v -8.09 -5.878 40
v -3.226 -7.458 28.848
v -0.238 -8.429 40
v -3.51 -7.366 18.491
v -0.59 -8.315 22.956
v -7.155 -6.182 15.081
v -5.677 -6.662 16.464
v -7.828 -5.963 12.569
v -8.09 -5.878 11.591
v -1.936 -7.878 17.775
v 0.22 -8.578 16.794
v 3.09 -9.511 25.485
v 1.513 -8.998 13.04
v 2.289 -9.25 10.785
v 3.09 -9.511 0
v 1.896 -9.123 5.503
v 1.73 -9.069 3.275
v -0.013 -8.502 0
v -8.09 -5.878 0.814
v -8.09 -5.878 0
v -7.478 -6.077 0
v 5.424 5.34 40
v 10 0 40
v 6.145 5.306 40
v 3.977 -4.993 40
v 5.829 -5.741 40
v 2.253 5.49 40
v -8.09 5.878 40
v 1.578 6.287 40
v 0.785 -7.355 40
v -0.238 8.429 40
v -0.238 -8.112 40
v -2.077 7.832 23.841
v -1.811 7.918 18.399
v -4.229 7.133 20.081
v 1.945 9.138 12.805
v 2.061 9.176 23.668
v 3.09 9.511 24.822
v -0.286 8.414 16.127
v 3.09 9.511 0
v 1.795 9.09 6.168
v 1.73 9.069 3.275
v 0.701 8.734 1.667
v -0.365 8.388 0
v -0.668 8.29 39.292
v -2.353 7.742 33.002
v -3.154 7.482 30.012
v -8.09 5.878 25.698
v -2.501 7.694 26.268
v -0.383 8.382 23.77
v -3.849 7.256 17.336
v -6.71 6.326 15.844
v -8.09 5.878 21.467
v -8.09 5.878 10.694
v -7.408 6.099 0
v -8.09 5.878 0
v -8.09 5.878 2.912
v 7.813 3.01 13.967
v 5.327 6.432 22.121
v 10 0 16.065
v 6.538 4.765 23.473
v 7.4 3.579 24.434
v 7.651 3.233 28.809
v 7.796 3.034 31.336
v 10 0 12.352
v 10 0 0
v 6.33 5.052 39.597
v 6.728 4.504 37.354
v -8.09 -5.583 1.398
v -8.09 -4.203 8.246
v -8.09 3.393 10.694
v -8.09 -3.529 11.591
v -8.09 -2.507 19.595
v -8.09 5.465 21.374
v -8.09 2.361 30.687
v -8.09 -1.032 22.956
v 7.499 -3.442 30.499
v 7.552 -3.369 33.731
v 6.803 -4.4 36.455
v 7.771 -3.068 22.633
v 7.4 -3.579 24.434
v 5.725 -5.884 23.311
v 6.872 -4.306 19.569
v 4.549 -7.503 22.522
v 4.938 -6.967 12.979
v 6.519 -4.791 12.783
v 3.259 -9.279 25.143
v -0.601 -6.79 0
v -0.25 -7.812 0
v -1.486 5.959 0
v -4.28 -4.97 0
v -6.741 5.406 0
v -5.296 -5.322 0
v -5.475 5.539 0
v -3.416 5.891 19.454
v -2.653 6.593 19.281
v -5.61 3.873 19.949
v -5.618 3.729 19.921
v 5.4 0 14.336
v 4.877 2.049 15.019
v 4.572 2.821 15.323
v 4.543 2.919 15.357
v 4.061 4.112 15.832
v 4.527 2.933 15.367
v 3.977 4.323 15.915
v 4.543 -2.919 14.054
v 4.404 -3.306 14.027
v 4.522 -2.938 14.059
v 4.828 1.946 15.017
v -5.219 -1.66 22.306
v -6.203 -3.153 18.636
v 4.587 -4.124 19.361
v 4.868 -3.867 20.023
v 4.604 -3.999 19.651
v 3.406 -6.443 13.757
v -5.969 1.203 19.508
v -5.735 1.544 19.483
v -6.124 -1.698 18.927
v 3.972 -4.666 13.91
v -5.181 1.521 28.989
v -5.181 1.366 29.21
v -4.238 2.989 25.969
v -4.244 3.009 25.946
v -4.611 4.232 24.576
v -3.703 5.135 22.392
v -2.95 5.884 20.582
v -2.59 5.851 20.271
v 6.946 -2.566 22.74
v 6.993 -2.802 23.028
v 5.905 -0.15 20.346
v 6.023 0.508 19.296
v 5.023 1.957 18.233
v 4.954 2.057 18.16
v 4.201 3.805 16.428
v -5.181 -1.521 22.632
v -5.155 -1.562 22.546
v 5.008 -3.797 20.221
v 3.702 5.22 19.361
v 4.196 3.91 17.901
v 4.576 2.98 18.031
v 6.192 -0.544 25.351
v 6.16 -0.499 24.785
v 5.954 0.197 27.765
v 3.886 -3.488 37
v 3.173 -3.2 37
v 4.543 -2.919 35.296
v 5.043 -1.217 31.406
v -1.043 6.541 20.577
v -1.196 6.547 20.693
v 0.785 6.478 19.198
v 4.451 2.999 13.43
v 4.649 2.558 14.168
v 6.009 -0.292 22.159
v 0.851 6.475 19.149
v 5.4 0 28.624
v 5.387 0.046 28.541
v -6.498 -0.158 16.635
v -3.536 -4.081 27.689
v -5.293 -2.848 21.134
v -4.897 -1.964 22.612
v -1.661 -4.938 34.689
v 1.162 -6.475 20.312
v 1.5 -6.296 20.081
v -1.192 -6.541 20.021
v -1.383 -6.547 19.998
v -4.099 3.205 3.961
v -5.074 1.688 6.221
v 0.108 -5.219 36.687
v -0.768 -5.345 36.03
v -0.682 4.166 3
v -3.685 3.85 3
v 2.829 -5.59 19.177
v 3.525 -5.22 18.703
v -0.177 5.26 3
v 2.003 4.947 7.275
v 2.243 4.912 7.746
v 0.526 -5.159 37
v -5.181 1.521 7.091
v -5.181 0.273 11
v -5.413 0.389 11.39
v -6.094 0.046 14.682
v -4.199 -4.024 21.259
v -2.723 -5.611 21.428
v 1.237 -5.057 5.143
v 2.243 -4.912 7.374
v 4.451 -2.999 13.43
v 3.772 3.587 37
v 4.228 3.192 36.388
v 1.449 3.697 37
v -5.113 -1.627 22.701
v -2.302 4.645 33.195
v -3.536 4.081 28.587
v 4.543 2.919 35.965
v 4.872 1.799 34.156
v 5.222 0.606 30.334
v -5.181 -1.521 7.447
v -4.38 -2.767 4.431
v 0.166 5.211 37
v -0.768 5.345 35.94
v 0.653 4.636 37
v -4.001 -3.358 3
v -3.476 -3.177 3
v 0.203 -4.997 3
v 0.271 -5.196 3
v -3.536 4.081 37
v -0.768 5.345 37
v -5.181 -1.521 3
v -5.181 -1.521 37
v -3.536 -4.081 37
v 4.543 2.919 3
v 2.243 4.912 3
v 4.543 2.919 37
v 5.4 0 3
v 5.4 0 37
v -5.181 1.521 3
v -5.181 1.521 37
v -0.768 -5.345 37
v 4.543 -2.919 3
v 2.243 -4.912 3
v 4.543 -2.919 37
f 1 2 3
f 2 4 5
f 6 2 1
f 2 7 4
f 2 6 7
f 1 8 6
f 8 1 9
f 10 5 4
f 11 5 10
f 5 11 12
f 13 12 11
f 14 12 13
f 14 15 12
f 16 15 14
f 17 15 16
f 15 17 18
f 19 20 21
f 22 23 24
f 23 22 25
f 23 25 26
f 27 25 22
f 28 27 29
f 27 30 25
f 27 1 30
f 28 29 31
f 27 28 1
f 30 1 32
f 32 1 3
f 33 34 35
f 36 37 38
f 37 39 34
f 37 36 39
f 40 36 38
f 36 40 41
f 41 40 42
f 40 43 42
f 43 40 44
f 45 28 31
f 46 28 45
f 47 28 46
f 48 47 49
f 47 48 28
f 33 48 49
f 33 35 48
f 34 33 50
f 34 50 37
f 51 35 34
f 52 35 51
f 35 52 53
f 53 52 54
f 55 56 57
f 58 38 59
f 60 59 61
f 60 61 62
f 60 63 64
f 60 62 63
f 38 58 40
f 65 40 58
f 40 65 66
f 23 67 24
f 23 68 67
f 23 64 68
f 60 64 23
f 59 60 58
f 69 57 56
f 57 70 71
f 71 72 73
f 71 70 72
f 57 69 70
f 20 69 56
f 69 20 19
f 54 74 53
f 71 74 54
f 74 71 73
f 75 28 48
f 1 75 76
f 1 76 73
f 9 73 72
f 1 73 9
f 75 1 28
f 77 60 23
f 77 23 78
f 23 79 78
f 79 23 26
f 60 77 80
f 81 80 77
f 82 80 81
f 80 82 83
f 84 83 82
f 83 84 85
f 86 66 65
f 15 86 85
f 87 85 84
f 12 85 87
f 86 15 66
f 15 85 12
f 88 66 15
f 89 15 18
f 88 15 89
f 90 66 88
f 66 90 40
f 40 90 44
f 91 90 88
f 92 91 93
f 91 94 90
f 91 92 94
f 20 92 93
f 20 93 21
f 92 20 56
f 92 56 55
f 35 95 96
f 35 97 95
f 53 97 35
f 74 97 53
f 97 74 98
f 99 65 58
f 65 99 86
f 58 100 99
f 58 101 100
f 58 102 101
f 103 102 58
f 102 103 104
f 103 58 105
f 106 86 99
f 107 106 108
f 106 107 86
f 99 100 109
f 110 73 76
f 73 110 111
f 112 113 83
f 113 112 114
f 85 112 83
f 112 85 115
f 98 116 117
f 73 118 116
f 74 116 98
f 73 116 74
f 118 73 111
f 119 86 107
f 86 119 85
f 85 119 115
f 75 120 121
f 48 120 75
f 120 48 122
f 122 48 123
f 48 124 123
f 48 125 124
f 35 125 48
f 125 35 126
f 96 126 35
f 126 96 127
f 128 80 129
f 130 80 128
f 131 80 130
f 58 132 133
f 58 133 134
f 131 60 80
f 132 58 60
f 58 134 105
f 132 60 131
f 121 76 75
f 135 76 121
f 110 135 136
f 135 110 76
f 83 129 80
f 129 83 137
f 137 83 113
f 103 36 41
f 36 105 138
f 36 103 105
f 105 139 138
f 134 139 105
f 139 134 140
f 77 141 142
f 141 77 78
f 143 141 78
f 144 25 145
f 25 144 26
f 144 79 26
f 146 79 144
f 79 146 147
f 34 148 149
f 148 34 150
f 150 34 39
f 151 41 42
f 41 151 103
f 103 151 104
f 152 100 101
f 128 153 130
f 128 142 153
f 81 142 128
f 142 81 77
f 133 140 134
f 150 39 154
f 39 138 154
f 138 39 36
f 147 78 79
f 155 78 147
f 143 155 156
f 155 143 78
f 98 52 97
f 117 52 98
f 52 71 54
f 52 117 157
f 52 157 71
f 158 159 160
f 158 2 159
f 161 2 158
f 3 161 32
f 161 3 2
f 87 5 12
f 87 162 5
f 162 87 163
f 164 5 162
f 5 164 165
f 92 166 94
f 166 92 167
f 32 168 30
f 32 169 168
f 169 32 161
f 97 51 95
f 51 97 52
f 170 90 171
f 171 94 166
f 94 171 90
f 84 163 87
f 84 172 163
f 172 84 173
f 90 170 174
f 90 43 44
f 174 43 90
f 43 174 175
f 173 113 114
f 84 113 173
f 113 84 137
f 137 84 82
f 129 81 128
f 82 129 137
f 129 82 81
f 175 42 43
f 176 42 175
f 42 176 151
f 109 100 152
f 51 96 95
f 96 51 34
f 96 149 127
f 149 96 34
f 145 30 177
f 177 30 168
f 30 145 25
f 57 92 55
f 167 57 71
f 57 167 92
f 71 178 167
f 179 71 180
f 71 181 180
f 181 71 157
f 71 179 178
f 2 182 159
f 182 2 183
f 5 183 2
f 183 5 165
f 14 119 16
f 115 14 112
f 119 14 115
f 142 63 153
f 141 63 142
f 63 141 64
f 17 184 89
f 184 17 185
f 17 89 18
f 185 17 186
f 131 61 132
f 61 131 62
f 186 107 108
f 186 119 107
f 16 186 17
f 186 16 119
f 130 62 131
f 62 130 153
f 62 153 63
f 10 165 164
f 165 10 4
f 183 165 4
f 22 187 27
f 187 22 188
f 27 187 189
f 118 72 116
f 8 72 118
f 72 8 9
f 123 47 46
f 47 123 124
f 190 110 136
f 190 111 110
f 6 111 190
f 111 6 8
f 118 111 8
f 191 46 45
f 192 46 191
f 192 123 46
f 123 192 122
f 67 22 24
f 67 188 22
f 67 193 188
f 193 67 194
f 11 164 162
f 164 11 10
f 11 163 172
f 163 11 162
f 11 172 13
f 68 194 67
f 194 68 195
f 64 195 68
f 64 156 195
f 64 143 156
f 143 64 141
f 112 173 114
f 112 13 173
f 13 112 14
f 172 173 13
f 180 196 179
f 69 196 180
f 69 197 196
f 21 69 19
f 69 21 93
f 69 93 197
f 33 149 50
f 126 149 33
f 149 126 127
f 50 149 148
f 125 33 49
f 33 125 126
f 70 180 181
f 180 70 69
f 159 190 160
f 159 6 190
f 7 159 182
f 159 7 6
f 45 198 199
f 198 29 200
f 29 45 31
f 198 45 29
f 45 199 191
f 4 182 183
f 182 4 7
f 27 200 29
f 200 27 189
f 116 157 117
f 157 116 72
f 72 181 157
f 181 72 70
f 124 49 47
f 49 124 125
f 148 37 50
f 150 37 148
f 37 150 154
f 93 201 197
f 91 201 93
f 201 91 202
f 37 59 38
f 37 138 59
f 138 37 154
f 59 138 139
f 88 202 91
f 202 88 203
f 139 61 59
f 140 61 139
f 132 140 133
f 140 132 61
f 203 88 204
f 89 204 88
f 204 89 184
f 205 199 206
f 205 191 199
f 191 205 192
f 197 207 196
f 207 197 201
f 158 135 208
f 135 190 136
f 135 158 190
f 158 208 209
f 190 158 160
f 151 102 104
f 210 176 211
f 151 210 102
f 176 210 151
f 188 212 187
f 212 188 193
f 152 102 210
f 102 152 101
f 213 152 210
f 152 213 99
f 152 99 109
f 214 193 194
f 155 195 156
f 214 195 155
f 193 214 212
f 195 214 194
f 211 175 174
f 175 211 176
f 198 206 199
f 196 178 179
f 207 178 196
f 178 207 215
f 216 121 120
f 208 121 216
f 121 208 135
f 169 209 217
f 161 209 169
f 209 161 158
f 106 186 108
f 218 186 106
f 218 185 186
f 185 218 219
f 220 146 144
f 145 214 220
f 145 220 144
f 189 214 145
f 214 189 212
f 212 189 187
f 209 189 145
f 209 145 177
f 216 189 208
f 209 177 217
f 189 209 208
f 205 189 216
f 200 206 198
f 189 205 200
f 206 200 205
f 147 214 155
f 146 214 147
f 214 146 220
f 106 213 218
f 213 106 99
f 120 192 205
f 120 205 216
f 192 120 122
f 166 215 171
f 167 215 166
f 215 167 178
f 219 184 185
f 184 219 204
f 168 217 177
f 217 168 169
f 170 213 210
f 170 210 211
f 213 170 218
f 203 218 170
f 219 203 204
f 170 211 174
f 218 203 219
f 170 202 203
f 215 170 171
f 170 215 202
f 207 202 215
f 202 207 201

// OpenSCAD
scale (2,2,2)
color("DarkTurquoise")
translate(v=[0,0,10])
difference() {
		  cylinder (h = 20, r=5, center = true, $fn=5);

        rotate ([60,150,55]) 
		  cylinder (h =20, r=3, center = true, $fn=3);

		  rotate ([30,15,0]) 
		  cylinder (h =40, r=3, center = true, $fn=7);

		  rotate ([150,15,0]) 
		  cylinder (h =40, r=3, center = true, $fn=9);

		  cylinder (h =17, r=2.7, center = true, $fn=11);
}
